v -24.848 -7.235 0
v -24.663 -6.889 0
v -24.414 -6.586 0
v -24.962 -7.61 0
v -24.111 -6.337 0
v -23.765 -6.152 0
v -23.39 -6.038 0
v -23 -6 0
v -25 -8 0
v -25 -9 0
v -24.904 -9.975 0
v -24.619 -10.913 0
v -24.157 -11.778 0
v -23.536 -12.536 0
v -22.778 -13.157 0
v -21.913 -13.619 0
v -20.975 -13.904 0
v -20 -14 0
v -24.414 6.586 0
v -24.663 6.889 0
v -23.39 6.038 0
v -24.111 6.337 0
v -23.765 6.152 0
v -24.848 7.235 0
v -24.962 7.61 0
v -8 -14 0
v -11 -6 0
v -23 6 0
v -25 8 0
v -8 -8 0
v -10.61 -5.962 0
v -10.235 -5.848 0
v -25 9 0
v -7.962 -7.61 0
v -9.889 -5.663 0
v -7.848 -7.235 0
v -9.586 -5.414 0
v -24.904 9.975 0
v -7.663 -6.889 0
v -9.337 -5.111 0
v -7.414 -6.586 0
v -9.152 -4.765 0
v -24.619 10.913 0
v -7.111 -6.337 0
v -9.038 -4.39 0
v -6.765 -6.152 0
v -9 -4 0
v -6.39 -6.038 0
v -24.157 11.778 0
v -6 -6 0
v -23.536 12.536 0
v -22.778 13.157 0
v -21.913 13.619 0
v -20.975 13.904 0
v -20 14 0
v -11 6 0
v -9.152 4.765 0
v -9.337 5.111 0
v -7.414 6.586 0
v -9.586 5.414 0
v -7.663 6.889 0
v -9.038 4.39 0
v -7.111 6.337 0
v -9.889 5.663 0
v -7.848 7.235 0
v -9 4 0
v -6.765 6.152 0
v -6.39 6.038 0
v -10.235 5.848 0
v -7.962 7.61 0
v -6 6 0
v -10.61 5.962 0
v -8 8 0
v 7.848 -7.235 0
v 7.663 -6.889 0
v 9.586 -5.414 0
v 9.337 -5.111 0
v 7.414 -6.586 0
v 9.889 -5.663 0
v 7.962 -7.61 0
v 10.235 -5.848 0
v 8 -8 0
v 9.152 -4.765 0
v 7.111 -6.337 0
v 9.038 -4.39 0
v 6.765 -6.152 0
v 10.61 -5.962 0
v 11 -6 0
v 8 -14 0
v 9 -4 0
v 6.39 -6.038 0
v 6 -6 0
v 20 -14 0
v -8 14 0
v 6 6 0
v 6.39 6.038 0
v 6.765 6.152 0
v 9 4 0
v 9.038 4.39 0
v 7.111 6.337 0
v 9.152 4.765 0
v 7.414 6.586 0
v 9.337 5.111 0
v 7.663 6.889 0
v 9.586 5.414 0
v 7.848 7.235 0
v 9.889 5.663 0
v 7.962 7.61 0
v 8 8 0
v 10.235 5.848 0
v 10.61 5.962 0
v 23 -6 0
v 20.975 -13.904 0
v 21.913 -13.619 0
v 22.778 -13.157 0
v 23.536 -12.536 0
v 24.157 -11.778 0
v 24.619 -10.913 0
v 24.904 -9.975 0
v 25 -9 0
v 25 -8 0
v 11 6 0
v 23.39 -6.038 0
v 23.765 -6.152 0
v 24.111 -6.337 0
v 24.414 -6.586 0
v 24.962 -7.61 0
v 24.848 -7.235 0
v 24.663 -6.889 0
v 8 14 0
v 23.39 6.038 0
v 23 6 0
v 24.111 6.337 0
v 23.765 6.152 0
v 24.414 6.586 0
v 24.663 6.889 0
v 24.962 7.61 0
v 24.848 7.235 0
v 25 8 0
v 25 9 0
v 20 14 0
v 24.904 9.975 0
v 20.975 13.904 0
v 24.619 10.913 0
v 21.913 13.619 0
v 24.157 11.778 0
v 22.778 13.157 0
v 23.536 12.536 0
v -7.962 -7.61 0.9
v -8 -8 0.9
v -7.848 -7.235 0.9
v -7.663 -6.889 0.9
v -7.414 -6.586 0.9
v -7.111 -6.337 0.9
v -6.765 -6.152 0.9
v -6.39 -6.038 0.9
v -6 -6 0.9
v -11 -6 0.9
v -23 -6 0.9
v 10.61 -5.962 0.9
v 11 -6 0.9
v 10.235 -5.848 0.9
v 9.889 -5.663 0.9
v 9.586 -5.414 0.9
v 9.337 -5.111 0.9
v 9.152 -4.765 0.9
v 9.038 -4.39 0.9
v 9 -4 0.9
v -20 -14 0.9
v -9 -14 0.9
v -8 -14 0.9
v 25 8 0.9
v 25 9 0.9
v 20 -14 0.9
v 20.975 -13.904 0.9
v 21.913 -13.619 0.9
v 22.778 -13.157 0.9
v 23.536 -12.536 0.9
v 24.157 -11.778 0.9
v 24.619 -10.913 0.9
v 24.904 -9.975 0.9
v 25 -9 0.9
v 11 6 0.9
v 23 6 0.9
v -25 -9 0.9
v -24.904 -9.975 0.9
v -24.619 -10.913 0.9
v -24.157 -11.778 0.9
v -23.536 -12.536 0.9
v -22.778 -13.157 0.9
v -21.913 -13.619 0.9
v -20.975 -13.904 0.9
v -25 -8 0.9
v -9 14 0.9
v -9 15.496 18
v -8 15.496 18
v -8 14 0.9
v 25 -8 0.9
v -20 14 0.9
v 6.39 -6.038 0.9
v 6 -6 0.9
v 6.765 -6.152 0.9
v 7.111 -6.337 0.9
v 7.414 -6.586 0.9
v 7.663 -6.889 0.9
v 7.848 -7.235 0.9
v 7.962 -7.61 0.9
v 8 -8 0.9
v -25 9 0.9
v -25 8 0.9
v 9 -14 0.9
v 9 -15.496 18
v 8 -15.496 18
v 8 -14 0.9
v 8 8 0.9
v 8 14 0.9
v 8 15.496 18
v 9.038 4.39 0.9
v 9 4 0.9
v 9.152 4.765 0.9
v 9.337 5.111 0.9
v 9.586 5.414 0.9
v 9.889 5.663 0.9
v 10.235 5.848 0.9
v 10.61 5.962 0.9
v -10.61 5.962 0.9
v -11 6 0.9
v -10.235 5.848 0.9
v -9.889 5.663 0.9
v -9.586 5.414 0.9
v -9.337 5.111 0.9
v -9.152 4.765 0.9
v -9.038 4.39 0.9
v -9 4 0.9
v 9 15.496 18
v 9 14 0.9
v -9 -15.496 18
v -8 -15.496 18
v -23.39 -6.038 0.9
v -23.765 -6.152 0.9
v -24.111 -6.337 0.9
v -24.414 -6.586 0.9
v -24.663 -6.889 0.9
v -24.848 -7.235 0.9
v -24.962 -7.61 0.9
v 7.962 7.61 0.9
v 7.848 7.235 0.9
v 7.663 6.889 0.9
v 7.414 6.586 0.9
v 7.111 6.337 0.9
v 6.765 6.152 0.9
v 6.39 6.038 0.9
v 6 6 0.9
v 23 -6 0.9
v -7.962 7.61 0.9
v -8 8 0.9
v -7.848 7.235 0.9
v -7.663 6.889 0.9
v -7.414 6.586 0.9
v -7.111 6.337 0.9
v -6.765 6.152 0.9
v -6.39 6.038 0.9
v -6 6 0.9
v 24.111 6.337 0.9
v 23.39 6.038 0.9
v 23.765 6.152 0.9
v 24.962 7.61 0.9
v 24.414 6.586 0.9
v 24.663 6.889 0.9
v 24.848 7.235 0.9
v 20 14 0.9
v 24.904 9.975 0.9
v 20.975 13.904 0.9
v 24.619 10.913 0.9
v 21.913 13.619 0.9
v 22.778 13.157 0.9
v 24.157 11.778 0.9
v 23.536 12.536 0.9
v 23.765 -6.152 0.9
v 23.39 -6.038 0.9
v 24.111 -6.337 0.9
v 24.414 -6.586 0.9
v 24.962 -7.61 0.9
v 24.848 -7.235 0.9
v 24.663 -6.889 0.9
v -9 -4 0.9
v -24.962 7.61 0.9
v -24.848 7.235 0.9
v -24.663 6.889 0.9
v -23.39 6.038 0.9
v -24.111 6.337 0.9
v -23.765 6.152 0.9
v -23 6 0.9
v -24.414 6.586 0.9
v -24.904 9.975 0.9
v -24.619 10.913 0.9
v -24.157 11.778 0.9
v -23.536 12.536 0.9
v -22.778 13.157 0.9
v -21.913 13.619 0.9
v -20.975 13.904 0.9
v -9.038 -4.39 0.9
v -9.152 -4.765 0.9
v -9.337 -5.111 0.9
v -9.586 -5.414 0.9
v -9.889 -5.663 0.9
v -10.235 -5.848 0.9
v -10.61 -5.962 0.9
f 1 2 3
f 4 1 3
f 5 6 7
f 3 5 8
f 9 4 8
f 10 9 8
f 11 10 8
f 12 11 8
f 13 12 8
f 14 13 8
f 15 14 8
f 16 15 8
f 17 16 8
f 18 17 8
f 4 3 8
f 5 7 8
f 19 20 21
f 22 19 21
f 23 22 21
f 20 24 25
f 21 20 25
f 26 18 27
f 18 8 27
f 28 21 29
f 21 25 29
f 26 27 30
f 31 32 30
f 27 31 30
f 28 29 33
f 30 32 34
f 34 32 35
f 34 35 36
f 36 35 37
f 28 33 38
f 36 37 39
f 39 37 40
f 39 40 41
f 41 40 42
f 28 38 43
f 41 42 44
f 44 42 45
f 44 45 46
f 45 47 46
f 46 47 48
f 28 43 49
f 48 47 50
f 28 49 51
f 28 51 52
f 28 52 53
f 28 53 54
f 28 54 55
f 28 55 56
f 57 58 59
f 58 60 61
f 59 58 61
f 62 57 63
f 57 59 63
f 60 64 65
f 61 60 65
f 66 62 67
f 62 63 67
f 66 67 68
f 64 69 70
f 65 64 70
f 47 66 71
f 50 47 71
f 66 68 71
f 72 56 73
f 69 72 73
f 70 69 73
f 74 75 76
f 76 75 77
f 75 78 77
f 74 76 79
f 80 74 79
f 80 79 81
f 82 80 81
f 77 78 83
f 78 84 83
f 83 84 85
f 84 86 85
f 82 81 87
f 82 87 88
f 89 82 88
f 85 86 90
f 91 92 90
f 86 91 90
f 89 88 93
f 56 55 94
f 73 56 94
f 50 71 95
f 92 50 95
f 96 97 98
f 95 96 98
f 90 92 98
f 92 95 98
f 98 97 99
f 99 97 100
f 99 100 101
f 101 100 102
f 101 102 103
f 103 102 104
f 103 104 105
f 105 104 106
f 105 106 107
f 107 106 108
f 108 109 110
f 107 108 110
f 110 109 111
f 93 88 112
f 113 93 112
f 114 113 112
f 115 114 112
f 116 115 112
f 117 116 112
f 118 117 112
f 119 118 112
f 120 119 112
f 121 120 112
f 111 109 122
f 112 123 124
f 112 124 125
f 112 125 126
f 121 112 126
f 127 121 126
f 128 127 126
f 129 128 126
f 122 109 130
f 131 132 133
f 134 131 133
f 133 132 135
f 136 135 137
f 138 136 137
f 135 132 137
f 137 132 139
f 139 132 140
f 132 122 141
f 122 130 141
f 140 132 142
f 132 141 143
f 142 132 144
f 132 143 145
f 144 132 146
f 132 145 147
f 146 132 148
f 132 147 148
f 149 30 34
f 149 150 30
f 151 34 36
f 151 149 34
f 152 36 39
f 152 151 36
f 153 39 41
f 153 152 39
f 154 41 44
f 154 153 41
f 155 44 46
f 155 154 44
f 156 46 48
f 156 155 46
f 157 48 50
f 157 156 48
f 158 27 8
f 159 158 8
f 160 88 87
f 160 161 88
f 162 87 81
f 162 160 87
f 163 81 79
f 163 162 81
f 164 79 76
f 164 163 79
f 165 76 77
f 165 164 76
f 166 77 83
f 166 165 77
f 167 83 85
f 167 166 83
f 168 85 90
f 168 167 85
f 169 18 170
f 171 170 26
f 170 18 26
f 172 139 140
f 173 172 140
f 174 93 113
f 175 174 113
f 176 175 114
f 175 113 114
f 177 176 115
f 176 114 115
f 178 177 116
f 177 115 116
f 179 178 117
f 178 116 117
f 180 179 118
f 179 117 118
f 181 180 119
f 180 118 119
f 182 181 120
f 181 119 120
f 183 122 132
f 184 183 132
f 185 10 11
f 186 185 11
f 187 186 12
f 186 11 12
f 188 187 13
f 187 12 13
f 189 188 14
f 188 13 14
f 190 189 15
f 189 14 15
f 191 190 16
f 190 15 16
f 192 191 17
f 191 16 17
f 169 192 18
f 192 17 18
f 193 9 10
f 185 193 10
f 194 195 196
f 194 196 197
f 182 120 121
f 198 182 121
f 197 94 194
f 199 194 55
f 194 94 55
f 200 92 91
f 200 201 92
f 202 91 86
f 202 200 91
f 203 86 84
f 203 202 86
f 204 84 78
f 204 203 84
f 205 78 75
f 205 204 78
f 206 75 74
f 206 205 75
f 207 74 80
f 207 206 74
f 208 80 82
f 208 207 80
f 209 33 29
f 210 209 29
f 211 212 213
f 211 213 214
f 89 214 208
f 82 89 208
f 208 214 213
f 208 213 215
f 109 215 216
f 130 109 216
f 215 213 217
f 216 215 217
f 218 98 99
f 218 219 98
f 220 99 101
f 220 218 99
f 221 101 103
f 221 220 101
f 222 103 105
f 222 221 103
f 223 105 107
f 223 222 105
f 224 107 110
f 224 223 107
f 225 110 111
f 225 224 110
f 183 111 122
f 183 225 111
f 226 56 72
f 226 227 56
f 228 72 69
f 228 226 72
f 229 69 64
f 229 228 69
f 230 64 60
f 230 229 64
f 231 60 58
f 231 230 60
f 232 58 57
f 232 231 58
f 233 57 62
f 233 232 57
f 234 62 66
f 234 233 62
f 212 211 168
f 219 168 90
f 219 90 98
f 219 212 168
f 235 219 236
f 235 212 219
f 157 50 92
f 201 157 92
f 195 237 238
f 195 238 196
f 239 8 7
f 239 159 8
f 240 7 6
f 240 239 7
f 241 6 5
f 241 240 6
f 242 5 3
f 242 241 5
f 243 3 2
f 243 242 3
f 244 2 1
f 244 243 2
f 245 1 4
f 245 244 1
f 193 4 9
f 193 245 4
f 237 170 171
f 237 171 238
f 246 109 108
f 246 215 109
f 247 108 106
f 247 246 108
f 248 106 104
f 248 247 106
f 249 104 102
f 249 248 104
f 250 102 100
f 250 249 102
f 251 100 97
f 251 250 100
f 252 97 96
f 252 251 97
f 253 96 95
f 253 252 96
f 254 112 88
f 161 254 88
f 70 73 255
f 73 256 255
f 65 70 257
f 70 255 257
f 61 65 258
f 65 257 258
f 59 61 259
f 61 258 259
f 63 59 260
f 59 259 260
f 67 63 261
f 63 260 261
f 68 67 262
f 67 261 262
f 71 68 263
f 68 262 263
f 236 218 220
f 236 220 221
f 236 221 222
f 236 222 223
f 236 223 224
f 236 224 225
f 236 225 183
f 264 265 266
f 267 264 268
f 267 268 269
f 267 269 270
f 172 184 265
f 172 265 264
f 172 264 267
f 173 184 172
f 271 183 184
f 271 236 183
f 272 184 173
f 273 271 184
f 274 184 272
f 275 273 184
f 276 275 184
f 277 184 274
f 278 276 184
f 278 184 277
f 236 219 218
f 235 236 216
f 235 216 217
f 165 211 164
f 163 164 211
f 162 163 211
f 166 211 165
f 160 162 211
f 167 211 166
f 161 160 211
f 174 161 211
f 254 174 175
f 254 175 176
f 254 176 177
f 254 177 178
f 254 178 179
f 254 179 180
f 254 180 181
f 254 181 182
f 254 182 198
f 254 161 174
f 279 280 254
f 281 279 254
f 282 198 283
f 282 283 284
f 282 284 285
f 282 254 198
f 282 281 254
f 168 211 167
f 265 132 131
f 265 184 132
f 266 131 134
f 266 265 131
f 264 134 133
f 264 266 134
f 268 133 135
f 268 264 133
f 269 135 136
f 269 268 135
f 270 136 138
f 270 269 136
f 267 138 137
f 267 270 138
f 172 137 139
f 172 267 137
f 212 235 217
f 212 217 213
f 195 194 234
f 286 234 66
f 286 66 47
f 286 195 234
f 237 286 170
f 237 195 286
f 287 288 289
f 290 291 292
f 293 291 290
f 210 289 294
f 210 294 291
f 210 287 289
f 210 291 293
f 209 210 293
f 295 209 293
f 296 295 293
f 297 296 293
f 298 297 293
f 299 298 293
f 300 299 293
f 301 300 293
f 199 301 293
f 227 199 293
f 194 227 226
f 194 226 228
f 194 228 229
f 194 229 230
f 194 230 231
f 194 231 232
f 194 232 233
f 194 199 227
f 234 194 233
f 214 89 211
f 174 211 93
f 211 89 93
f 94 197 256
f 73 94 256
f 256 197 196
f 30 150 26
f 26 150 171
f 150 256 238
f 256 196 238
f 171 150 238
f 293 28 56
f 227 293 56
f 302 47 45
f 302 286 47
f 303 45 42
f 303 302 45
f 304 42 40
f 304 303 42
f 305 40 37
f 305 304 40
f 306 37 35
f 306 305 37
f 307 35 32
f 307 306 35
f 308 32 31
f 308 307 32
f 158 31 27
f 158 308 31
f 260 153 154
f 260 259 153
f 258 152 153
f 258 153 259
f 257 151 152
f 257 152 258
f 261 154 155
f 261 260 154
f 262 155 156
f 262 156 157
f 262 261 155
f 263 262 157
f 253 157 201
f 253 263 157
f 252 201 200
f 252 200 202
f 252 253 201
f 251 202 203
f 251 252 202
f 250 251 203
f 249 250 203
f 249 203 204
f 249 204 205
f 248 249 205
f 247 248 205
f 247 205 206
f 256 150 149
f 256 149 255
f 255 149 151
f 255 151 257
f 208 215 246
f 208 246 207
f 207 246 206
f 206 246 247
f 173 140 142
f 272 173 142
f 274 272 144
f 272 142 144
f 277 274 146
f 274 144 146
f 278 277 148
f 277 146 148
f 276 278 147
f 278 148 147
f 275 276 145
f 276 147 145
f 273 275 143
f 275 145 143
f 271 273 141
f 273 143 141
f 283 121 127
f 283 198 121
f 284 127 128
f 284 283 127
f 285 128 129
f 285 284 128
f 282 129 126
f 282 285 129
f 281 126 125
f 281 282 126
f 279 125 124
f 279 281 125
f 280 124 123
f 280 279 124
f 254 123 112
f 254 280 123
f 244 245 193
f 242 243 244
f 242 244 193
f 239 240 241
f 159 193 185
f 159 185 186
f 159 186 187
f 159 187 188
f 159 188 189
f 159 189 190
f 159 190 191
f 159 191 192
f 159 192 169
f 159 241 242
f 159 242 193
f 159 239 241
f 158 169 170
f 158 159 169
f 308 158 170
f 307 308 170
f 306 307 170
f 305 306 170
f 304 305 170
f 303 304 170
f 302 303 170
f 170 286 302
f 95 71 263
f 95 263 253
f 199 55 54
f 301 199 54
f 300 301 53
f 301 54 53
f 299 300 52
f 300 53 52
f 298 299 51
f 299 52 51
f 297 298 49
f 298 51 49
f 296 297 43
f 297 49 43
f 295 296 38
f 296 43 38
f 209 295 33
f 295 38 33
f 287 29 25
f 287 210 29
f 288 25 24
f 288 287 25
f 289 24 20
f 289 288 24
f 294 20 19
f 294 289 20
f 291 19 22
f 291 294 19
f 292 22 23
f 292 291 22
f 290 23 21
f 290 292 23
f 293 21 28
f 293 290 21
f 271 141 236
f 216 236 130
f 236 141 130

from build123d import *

# Parameters (mm, degrees)
F0_W     = 1
F0_H     = 8
F0_H_2   = 12
F0_W_2   = 16
F1_DEPTH = 0.9
F2_DEPTH = 18
F3_R     = 2
F5_DEPTH = 1
F7_DEPTH = 1


with BuildPart() as f1:
    # F0 (on Top) → F1 (new body)
    with BuildSketch(Plane.XY):
        with BuildLine():
            Line((-9, 14), (-20, 14))
            ThreePointArc((-20, 14), (-23.5355339059, 12.5355339059), (-25, 9))
            Line((-25, 9), (-25, 6))
            Line((-25, 6), (-9, 6))
            Line((-9, 6), (-9, 14))
        make_face()
        with Locations((-8.5, 10)):
            Rectangle(F0_W, F0_H)
        with Locations((-8.5, 0)):
            Rectangle(F0_W, F0_H_2)
        with Locations((-8.5, -10)):
            Rectangle(F0_W, F0_H)
        with BuildLine():
            Line((-9, -14), (-9, -6))
            Line((-9, -6), (-25, -6))
            Line((-25, -6), (-25, -9))
            ThreePointArc((-25, -9), (-23.5355339059, -12.5355339059), (-20, -14))
            Line((-20, -14), (-9, -14))
        make_face()
        with BuildLine():
            Line((25, -6), (9, -6))
            Line((9, -6), (9, -14))
            Line((9, -14), (20, -14))
            ThreePointArc((20, -14), (23.5355339059, -12.5355339059), (25, -9))
            Line((25, -9), (25, -6))
        make_face()
        with BuildLine():
            Line((20, 14), (9, 14))
            Line((9, 14), (9, 6))
            Line((9, 6), (25, 6))
            Line((25, 6), (25, 9))
            ThreePointArc((25, 9), (23.5355339059, 12.5355339059), (20, 14))
        make_face()
        with Locations((8.5, 10)):
            Rectangle(F0_W, F0_H)
        with Locations((8.5, 0)):
            Rectangle(F0_W, F0_H_2)
        with Locations((8.5, -10)):
            Rectangle(F0_W, F0_H)
        Rectangle(F0_W_2, F0_H_2)
    extrude(amount=F1_DEPTH)

    # F0 (on Top) → F2 (join)
    with BuildSketch(Plane.XY):
        with Locations((-8.5, -10)):
            Rectangle(F0_W, F0_H)
        with Locations((-8.5, 0)):
            Rectangle(F0_W, F0_H_2)
        with Locations((-8.5, 10)):
            Rectangle(F0_W, F0_H)
        with Locations((8.5, 10)):
            Rectangle(F0_W, F0_H)
        with Locations((8.5, 0)):
            Rectangle(F0_W, F0_H_2)
        with Locations((8.5, -10)):
            Rectangle(F0_W, F0_H)
    extrude(amount=F2_DEPTH)

    # F3
    f3_edges = [f1.edges().sort_by_distance(p)[0] for p in [
        (-25, 6, 0.45),
        (-9, 6, 0.45),
        (-9, -6, 0.45),
        (-25, -6, 0.45),
        (-8, 6, 0.45),
        (8, 6, 0.45),
        (25, 6, 0.45),
        (25, -6, 0.45),
        (9, 6, 0.45),
        (9, -6, 0.45),
        (8, -6, 0.45),
        (-8, -6, 0.45),
    ]]
    fillet(f3_edges, radius=F3_R)

    # F4 (on face) → F5 (join)
    with BuildSketch(Plane.YZ.offset(9)):
        Polygon((-15.4960561463, 18), (-14, 0.9), (-14, 18), align=None)
        Polygon((15.4960561463, 18), (14, 18), (14, 0.9), align=None)
    extrude(amount=-F5_DEPTH)

    # F6 (on face) → F7 (join)
    with BuildSketch(Plane(origin=(-9, 0, 0), x_dir=(0, -1, 0), z_dir=(-1, 0, 0))):
        Polygon((-14, 0.9), (-14, 18), (-15.4960561463, 18), align=None)
        Polygon((15.4960561463, 18), (14, 18), (14, 0.9), align=None)
    extrude(amount=-F7_DEPTH)


solid = f1.part
